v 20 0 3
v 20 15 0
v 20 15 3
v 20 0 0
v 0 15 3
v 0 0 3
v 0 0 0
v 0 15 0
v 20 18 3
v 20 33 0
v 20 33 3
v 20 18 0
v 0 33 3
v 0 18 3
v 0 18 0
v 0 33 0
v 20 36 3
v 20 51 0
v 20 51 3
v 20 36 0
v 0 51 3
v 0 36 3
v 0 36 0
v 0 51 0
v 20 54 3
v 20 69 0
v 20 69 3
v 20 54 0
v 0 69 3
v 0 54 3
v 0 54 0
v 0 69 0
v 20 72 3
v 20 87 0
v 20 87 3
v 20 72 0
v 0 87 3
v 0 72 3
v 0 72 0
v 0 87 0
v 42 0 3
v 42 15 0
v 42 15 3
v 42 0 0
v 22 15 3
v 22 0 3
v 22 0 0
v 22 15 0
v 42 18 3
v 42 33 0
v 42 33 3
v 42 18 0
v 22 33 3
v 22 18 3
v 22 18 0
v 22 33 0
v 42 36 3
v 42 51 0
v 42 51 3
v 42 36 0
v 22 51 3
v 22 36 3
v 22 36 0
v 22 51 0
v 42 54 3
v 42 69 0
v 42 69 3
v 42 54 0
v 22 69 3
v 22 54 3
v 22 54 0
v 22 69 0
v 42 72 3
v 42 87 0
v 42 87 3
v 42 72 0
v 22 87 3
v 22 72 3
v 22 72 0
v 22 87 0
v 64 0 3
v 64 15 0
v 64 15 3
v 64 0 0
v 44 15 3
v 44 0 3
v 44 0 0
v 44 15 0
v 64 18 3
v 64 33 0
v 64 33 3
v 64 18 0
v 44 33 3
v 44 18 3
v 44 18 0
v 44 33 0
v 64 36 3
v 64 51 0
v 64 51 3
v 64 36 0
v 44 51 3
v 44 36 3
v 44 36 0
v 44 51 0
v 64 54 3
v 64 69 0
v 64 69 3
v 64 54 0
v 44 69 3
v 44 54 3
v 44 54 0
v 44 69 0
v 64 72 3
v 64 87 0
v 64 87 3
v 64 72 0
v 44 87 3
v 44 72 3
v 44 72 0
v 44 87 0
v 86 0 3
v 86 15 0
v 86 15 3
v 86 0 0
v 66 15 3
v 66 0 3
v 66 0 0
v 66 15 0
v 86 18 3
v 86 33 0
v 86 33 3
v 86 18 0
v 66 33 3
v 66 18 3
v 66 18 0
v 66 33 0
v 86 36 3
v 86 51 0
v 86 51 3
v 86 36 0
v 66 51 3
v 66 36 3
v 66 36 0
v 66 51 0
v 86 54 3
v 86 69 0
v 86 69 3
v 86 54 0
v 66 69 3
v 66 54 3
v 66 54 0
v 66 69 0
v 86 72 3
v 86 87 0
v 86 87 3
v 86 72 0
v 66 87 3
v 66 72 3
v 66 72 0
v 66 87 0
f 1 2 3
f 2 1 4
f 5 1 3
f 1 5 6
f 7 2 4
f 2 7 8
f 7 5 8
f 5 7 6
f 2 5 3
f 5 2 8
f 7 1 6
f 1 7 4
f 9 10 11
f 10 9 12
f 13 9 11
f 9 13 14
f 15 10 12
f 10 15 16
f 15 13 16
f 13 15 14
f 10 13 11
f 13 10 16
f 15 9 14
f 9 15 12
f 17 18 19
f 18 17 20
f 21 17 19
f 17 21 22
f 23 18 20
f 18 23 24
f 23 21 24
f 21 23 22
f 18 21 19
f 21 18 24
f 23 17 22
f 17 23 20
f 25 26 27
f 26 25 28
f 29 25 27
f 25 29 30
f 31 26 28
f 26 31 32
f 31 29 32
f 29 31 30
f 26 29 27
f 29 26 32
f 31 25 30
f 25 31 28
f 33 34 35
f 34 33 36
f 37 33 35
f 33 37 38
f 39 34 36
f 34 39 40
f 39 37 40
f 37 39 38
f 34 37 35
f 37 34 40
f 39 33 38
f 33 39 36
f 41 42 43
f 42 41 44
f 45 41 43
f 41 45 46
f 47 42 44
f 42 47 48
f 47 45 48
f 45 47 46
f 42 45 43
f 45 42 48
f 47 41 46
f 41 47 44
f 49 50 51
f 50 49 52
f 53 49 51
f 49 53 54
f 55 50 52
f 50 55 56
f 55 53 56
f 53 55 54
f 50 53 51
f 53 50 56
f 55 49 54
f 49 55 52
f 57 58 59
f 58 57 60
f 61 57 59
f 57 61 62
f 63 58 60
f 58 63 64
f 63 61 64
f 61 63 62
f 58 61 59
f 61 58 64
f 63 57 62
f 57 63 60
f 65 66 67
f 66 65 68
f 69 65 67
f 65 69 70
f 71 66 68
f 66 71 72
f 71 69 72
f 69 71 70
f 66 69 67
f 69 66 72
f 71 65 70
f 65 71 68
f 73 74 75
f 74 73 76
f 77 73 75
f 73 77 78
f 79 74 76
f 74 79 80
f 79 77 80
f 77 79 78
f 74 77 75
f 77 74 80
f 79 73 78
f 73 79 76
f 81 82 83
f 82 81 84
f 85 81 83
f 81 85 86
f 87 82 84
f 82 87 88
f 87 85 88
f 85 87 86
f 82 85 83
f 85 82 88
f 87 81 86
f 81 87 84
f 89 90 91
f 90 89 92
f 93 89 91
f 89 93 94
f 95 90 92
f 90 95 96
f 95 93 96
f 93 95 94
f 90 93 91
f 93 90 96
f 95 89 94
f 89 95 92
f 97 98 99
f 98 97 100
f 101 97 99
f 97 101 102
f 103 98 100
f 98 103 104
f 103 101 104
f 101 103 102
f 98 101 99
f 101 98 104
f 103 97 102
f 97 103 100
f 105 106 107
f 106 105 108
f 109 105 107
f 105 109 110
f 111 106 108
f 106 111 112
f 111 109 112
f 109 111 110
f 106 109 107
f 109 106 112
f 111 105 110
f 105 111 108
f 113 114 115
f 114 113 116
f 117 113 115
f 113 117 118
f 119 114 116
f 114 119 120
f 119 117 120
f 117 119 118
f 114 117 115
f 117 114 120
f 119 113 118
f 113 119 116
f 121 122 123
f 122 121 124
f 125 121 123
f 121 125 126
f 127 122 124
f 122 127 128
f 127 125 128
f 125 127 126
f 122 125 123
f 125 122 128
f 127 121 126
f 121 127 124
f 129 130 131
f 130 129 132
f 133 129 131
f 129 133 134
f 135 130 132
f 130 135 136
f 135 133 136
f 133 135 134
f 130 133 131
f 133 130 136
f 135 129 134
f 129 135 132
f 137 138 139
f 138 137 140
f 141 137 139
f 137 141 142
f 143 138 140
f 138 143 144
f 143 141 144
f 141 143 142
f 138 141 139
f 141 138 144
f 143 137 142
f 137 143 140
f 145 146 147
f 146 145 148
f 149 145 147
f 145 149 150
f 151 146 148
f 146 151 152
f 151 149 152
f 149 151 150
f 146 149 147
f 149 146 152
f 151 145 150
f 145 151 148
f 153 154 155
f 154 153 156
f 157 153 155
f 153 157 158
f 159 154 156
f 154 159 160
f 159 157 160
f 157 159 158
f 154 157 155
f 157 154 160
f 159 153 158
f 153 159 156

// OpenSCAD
spacer_x = 20;
spacer_y = 15;
spacer_z = 3;

for(x = [0:3]) {
    for(y = [0:4]) {
        translate([x * spacer_x * 1.1, y * spacer_y * 1.2, 0])
            cube([spacer_x, spacer_y, spacer_z]);
    }
}
